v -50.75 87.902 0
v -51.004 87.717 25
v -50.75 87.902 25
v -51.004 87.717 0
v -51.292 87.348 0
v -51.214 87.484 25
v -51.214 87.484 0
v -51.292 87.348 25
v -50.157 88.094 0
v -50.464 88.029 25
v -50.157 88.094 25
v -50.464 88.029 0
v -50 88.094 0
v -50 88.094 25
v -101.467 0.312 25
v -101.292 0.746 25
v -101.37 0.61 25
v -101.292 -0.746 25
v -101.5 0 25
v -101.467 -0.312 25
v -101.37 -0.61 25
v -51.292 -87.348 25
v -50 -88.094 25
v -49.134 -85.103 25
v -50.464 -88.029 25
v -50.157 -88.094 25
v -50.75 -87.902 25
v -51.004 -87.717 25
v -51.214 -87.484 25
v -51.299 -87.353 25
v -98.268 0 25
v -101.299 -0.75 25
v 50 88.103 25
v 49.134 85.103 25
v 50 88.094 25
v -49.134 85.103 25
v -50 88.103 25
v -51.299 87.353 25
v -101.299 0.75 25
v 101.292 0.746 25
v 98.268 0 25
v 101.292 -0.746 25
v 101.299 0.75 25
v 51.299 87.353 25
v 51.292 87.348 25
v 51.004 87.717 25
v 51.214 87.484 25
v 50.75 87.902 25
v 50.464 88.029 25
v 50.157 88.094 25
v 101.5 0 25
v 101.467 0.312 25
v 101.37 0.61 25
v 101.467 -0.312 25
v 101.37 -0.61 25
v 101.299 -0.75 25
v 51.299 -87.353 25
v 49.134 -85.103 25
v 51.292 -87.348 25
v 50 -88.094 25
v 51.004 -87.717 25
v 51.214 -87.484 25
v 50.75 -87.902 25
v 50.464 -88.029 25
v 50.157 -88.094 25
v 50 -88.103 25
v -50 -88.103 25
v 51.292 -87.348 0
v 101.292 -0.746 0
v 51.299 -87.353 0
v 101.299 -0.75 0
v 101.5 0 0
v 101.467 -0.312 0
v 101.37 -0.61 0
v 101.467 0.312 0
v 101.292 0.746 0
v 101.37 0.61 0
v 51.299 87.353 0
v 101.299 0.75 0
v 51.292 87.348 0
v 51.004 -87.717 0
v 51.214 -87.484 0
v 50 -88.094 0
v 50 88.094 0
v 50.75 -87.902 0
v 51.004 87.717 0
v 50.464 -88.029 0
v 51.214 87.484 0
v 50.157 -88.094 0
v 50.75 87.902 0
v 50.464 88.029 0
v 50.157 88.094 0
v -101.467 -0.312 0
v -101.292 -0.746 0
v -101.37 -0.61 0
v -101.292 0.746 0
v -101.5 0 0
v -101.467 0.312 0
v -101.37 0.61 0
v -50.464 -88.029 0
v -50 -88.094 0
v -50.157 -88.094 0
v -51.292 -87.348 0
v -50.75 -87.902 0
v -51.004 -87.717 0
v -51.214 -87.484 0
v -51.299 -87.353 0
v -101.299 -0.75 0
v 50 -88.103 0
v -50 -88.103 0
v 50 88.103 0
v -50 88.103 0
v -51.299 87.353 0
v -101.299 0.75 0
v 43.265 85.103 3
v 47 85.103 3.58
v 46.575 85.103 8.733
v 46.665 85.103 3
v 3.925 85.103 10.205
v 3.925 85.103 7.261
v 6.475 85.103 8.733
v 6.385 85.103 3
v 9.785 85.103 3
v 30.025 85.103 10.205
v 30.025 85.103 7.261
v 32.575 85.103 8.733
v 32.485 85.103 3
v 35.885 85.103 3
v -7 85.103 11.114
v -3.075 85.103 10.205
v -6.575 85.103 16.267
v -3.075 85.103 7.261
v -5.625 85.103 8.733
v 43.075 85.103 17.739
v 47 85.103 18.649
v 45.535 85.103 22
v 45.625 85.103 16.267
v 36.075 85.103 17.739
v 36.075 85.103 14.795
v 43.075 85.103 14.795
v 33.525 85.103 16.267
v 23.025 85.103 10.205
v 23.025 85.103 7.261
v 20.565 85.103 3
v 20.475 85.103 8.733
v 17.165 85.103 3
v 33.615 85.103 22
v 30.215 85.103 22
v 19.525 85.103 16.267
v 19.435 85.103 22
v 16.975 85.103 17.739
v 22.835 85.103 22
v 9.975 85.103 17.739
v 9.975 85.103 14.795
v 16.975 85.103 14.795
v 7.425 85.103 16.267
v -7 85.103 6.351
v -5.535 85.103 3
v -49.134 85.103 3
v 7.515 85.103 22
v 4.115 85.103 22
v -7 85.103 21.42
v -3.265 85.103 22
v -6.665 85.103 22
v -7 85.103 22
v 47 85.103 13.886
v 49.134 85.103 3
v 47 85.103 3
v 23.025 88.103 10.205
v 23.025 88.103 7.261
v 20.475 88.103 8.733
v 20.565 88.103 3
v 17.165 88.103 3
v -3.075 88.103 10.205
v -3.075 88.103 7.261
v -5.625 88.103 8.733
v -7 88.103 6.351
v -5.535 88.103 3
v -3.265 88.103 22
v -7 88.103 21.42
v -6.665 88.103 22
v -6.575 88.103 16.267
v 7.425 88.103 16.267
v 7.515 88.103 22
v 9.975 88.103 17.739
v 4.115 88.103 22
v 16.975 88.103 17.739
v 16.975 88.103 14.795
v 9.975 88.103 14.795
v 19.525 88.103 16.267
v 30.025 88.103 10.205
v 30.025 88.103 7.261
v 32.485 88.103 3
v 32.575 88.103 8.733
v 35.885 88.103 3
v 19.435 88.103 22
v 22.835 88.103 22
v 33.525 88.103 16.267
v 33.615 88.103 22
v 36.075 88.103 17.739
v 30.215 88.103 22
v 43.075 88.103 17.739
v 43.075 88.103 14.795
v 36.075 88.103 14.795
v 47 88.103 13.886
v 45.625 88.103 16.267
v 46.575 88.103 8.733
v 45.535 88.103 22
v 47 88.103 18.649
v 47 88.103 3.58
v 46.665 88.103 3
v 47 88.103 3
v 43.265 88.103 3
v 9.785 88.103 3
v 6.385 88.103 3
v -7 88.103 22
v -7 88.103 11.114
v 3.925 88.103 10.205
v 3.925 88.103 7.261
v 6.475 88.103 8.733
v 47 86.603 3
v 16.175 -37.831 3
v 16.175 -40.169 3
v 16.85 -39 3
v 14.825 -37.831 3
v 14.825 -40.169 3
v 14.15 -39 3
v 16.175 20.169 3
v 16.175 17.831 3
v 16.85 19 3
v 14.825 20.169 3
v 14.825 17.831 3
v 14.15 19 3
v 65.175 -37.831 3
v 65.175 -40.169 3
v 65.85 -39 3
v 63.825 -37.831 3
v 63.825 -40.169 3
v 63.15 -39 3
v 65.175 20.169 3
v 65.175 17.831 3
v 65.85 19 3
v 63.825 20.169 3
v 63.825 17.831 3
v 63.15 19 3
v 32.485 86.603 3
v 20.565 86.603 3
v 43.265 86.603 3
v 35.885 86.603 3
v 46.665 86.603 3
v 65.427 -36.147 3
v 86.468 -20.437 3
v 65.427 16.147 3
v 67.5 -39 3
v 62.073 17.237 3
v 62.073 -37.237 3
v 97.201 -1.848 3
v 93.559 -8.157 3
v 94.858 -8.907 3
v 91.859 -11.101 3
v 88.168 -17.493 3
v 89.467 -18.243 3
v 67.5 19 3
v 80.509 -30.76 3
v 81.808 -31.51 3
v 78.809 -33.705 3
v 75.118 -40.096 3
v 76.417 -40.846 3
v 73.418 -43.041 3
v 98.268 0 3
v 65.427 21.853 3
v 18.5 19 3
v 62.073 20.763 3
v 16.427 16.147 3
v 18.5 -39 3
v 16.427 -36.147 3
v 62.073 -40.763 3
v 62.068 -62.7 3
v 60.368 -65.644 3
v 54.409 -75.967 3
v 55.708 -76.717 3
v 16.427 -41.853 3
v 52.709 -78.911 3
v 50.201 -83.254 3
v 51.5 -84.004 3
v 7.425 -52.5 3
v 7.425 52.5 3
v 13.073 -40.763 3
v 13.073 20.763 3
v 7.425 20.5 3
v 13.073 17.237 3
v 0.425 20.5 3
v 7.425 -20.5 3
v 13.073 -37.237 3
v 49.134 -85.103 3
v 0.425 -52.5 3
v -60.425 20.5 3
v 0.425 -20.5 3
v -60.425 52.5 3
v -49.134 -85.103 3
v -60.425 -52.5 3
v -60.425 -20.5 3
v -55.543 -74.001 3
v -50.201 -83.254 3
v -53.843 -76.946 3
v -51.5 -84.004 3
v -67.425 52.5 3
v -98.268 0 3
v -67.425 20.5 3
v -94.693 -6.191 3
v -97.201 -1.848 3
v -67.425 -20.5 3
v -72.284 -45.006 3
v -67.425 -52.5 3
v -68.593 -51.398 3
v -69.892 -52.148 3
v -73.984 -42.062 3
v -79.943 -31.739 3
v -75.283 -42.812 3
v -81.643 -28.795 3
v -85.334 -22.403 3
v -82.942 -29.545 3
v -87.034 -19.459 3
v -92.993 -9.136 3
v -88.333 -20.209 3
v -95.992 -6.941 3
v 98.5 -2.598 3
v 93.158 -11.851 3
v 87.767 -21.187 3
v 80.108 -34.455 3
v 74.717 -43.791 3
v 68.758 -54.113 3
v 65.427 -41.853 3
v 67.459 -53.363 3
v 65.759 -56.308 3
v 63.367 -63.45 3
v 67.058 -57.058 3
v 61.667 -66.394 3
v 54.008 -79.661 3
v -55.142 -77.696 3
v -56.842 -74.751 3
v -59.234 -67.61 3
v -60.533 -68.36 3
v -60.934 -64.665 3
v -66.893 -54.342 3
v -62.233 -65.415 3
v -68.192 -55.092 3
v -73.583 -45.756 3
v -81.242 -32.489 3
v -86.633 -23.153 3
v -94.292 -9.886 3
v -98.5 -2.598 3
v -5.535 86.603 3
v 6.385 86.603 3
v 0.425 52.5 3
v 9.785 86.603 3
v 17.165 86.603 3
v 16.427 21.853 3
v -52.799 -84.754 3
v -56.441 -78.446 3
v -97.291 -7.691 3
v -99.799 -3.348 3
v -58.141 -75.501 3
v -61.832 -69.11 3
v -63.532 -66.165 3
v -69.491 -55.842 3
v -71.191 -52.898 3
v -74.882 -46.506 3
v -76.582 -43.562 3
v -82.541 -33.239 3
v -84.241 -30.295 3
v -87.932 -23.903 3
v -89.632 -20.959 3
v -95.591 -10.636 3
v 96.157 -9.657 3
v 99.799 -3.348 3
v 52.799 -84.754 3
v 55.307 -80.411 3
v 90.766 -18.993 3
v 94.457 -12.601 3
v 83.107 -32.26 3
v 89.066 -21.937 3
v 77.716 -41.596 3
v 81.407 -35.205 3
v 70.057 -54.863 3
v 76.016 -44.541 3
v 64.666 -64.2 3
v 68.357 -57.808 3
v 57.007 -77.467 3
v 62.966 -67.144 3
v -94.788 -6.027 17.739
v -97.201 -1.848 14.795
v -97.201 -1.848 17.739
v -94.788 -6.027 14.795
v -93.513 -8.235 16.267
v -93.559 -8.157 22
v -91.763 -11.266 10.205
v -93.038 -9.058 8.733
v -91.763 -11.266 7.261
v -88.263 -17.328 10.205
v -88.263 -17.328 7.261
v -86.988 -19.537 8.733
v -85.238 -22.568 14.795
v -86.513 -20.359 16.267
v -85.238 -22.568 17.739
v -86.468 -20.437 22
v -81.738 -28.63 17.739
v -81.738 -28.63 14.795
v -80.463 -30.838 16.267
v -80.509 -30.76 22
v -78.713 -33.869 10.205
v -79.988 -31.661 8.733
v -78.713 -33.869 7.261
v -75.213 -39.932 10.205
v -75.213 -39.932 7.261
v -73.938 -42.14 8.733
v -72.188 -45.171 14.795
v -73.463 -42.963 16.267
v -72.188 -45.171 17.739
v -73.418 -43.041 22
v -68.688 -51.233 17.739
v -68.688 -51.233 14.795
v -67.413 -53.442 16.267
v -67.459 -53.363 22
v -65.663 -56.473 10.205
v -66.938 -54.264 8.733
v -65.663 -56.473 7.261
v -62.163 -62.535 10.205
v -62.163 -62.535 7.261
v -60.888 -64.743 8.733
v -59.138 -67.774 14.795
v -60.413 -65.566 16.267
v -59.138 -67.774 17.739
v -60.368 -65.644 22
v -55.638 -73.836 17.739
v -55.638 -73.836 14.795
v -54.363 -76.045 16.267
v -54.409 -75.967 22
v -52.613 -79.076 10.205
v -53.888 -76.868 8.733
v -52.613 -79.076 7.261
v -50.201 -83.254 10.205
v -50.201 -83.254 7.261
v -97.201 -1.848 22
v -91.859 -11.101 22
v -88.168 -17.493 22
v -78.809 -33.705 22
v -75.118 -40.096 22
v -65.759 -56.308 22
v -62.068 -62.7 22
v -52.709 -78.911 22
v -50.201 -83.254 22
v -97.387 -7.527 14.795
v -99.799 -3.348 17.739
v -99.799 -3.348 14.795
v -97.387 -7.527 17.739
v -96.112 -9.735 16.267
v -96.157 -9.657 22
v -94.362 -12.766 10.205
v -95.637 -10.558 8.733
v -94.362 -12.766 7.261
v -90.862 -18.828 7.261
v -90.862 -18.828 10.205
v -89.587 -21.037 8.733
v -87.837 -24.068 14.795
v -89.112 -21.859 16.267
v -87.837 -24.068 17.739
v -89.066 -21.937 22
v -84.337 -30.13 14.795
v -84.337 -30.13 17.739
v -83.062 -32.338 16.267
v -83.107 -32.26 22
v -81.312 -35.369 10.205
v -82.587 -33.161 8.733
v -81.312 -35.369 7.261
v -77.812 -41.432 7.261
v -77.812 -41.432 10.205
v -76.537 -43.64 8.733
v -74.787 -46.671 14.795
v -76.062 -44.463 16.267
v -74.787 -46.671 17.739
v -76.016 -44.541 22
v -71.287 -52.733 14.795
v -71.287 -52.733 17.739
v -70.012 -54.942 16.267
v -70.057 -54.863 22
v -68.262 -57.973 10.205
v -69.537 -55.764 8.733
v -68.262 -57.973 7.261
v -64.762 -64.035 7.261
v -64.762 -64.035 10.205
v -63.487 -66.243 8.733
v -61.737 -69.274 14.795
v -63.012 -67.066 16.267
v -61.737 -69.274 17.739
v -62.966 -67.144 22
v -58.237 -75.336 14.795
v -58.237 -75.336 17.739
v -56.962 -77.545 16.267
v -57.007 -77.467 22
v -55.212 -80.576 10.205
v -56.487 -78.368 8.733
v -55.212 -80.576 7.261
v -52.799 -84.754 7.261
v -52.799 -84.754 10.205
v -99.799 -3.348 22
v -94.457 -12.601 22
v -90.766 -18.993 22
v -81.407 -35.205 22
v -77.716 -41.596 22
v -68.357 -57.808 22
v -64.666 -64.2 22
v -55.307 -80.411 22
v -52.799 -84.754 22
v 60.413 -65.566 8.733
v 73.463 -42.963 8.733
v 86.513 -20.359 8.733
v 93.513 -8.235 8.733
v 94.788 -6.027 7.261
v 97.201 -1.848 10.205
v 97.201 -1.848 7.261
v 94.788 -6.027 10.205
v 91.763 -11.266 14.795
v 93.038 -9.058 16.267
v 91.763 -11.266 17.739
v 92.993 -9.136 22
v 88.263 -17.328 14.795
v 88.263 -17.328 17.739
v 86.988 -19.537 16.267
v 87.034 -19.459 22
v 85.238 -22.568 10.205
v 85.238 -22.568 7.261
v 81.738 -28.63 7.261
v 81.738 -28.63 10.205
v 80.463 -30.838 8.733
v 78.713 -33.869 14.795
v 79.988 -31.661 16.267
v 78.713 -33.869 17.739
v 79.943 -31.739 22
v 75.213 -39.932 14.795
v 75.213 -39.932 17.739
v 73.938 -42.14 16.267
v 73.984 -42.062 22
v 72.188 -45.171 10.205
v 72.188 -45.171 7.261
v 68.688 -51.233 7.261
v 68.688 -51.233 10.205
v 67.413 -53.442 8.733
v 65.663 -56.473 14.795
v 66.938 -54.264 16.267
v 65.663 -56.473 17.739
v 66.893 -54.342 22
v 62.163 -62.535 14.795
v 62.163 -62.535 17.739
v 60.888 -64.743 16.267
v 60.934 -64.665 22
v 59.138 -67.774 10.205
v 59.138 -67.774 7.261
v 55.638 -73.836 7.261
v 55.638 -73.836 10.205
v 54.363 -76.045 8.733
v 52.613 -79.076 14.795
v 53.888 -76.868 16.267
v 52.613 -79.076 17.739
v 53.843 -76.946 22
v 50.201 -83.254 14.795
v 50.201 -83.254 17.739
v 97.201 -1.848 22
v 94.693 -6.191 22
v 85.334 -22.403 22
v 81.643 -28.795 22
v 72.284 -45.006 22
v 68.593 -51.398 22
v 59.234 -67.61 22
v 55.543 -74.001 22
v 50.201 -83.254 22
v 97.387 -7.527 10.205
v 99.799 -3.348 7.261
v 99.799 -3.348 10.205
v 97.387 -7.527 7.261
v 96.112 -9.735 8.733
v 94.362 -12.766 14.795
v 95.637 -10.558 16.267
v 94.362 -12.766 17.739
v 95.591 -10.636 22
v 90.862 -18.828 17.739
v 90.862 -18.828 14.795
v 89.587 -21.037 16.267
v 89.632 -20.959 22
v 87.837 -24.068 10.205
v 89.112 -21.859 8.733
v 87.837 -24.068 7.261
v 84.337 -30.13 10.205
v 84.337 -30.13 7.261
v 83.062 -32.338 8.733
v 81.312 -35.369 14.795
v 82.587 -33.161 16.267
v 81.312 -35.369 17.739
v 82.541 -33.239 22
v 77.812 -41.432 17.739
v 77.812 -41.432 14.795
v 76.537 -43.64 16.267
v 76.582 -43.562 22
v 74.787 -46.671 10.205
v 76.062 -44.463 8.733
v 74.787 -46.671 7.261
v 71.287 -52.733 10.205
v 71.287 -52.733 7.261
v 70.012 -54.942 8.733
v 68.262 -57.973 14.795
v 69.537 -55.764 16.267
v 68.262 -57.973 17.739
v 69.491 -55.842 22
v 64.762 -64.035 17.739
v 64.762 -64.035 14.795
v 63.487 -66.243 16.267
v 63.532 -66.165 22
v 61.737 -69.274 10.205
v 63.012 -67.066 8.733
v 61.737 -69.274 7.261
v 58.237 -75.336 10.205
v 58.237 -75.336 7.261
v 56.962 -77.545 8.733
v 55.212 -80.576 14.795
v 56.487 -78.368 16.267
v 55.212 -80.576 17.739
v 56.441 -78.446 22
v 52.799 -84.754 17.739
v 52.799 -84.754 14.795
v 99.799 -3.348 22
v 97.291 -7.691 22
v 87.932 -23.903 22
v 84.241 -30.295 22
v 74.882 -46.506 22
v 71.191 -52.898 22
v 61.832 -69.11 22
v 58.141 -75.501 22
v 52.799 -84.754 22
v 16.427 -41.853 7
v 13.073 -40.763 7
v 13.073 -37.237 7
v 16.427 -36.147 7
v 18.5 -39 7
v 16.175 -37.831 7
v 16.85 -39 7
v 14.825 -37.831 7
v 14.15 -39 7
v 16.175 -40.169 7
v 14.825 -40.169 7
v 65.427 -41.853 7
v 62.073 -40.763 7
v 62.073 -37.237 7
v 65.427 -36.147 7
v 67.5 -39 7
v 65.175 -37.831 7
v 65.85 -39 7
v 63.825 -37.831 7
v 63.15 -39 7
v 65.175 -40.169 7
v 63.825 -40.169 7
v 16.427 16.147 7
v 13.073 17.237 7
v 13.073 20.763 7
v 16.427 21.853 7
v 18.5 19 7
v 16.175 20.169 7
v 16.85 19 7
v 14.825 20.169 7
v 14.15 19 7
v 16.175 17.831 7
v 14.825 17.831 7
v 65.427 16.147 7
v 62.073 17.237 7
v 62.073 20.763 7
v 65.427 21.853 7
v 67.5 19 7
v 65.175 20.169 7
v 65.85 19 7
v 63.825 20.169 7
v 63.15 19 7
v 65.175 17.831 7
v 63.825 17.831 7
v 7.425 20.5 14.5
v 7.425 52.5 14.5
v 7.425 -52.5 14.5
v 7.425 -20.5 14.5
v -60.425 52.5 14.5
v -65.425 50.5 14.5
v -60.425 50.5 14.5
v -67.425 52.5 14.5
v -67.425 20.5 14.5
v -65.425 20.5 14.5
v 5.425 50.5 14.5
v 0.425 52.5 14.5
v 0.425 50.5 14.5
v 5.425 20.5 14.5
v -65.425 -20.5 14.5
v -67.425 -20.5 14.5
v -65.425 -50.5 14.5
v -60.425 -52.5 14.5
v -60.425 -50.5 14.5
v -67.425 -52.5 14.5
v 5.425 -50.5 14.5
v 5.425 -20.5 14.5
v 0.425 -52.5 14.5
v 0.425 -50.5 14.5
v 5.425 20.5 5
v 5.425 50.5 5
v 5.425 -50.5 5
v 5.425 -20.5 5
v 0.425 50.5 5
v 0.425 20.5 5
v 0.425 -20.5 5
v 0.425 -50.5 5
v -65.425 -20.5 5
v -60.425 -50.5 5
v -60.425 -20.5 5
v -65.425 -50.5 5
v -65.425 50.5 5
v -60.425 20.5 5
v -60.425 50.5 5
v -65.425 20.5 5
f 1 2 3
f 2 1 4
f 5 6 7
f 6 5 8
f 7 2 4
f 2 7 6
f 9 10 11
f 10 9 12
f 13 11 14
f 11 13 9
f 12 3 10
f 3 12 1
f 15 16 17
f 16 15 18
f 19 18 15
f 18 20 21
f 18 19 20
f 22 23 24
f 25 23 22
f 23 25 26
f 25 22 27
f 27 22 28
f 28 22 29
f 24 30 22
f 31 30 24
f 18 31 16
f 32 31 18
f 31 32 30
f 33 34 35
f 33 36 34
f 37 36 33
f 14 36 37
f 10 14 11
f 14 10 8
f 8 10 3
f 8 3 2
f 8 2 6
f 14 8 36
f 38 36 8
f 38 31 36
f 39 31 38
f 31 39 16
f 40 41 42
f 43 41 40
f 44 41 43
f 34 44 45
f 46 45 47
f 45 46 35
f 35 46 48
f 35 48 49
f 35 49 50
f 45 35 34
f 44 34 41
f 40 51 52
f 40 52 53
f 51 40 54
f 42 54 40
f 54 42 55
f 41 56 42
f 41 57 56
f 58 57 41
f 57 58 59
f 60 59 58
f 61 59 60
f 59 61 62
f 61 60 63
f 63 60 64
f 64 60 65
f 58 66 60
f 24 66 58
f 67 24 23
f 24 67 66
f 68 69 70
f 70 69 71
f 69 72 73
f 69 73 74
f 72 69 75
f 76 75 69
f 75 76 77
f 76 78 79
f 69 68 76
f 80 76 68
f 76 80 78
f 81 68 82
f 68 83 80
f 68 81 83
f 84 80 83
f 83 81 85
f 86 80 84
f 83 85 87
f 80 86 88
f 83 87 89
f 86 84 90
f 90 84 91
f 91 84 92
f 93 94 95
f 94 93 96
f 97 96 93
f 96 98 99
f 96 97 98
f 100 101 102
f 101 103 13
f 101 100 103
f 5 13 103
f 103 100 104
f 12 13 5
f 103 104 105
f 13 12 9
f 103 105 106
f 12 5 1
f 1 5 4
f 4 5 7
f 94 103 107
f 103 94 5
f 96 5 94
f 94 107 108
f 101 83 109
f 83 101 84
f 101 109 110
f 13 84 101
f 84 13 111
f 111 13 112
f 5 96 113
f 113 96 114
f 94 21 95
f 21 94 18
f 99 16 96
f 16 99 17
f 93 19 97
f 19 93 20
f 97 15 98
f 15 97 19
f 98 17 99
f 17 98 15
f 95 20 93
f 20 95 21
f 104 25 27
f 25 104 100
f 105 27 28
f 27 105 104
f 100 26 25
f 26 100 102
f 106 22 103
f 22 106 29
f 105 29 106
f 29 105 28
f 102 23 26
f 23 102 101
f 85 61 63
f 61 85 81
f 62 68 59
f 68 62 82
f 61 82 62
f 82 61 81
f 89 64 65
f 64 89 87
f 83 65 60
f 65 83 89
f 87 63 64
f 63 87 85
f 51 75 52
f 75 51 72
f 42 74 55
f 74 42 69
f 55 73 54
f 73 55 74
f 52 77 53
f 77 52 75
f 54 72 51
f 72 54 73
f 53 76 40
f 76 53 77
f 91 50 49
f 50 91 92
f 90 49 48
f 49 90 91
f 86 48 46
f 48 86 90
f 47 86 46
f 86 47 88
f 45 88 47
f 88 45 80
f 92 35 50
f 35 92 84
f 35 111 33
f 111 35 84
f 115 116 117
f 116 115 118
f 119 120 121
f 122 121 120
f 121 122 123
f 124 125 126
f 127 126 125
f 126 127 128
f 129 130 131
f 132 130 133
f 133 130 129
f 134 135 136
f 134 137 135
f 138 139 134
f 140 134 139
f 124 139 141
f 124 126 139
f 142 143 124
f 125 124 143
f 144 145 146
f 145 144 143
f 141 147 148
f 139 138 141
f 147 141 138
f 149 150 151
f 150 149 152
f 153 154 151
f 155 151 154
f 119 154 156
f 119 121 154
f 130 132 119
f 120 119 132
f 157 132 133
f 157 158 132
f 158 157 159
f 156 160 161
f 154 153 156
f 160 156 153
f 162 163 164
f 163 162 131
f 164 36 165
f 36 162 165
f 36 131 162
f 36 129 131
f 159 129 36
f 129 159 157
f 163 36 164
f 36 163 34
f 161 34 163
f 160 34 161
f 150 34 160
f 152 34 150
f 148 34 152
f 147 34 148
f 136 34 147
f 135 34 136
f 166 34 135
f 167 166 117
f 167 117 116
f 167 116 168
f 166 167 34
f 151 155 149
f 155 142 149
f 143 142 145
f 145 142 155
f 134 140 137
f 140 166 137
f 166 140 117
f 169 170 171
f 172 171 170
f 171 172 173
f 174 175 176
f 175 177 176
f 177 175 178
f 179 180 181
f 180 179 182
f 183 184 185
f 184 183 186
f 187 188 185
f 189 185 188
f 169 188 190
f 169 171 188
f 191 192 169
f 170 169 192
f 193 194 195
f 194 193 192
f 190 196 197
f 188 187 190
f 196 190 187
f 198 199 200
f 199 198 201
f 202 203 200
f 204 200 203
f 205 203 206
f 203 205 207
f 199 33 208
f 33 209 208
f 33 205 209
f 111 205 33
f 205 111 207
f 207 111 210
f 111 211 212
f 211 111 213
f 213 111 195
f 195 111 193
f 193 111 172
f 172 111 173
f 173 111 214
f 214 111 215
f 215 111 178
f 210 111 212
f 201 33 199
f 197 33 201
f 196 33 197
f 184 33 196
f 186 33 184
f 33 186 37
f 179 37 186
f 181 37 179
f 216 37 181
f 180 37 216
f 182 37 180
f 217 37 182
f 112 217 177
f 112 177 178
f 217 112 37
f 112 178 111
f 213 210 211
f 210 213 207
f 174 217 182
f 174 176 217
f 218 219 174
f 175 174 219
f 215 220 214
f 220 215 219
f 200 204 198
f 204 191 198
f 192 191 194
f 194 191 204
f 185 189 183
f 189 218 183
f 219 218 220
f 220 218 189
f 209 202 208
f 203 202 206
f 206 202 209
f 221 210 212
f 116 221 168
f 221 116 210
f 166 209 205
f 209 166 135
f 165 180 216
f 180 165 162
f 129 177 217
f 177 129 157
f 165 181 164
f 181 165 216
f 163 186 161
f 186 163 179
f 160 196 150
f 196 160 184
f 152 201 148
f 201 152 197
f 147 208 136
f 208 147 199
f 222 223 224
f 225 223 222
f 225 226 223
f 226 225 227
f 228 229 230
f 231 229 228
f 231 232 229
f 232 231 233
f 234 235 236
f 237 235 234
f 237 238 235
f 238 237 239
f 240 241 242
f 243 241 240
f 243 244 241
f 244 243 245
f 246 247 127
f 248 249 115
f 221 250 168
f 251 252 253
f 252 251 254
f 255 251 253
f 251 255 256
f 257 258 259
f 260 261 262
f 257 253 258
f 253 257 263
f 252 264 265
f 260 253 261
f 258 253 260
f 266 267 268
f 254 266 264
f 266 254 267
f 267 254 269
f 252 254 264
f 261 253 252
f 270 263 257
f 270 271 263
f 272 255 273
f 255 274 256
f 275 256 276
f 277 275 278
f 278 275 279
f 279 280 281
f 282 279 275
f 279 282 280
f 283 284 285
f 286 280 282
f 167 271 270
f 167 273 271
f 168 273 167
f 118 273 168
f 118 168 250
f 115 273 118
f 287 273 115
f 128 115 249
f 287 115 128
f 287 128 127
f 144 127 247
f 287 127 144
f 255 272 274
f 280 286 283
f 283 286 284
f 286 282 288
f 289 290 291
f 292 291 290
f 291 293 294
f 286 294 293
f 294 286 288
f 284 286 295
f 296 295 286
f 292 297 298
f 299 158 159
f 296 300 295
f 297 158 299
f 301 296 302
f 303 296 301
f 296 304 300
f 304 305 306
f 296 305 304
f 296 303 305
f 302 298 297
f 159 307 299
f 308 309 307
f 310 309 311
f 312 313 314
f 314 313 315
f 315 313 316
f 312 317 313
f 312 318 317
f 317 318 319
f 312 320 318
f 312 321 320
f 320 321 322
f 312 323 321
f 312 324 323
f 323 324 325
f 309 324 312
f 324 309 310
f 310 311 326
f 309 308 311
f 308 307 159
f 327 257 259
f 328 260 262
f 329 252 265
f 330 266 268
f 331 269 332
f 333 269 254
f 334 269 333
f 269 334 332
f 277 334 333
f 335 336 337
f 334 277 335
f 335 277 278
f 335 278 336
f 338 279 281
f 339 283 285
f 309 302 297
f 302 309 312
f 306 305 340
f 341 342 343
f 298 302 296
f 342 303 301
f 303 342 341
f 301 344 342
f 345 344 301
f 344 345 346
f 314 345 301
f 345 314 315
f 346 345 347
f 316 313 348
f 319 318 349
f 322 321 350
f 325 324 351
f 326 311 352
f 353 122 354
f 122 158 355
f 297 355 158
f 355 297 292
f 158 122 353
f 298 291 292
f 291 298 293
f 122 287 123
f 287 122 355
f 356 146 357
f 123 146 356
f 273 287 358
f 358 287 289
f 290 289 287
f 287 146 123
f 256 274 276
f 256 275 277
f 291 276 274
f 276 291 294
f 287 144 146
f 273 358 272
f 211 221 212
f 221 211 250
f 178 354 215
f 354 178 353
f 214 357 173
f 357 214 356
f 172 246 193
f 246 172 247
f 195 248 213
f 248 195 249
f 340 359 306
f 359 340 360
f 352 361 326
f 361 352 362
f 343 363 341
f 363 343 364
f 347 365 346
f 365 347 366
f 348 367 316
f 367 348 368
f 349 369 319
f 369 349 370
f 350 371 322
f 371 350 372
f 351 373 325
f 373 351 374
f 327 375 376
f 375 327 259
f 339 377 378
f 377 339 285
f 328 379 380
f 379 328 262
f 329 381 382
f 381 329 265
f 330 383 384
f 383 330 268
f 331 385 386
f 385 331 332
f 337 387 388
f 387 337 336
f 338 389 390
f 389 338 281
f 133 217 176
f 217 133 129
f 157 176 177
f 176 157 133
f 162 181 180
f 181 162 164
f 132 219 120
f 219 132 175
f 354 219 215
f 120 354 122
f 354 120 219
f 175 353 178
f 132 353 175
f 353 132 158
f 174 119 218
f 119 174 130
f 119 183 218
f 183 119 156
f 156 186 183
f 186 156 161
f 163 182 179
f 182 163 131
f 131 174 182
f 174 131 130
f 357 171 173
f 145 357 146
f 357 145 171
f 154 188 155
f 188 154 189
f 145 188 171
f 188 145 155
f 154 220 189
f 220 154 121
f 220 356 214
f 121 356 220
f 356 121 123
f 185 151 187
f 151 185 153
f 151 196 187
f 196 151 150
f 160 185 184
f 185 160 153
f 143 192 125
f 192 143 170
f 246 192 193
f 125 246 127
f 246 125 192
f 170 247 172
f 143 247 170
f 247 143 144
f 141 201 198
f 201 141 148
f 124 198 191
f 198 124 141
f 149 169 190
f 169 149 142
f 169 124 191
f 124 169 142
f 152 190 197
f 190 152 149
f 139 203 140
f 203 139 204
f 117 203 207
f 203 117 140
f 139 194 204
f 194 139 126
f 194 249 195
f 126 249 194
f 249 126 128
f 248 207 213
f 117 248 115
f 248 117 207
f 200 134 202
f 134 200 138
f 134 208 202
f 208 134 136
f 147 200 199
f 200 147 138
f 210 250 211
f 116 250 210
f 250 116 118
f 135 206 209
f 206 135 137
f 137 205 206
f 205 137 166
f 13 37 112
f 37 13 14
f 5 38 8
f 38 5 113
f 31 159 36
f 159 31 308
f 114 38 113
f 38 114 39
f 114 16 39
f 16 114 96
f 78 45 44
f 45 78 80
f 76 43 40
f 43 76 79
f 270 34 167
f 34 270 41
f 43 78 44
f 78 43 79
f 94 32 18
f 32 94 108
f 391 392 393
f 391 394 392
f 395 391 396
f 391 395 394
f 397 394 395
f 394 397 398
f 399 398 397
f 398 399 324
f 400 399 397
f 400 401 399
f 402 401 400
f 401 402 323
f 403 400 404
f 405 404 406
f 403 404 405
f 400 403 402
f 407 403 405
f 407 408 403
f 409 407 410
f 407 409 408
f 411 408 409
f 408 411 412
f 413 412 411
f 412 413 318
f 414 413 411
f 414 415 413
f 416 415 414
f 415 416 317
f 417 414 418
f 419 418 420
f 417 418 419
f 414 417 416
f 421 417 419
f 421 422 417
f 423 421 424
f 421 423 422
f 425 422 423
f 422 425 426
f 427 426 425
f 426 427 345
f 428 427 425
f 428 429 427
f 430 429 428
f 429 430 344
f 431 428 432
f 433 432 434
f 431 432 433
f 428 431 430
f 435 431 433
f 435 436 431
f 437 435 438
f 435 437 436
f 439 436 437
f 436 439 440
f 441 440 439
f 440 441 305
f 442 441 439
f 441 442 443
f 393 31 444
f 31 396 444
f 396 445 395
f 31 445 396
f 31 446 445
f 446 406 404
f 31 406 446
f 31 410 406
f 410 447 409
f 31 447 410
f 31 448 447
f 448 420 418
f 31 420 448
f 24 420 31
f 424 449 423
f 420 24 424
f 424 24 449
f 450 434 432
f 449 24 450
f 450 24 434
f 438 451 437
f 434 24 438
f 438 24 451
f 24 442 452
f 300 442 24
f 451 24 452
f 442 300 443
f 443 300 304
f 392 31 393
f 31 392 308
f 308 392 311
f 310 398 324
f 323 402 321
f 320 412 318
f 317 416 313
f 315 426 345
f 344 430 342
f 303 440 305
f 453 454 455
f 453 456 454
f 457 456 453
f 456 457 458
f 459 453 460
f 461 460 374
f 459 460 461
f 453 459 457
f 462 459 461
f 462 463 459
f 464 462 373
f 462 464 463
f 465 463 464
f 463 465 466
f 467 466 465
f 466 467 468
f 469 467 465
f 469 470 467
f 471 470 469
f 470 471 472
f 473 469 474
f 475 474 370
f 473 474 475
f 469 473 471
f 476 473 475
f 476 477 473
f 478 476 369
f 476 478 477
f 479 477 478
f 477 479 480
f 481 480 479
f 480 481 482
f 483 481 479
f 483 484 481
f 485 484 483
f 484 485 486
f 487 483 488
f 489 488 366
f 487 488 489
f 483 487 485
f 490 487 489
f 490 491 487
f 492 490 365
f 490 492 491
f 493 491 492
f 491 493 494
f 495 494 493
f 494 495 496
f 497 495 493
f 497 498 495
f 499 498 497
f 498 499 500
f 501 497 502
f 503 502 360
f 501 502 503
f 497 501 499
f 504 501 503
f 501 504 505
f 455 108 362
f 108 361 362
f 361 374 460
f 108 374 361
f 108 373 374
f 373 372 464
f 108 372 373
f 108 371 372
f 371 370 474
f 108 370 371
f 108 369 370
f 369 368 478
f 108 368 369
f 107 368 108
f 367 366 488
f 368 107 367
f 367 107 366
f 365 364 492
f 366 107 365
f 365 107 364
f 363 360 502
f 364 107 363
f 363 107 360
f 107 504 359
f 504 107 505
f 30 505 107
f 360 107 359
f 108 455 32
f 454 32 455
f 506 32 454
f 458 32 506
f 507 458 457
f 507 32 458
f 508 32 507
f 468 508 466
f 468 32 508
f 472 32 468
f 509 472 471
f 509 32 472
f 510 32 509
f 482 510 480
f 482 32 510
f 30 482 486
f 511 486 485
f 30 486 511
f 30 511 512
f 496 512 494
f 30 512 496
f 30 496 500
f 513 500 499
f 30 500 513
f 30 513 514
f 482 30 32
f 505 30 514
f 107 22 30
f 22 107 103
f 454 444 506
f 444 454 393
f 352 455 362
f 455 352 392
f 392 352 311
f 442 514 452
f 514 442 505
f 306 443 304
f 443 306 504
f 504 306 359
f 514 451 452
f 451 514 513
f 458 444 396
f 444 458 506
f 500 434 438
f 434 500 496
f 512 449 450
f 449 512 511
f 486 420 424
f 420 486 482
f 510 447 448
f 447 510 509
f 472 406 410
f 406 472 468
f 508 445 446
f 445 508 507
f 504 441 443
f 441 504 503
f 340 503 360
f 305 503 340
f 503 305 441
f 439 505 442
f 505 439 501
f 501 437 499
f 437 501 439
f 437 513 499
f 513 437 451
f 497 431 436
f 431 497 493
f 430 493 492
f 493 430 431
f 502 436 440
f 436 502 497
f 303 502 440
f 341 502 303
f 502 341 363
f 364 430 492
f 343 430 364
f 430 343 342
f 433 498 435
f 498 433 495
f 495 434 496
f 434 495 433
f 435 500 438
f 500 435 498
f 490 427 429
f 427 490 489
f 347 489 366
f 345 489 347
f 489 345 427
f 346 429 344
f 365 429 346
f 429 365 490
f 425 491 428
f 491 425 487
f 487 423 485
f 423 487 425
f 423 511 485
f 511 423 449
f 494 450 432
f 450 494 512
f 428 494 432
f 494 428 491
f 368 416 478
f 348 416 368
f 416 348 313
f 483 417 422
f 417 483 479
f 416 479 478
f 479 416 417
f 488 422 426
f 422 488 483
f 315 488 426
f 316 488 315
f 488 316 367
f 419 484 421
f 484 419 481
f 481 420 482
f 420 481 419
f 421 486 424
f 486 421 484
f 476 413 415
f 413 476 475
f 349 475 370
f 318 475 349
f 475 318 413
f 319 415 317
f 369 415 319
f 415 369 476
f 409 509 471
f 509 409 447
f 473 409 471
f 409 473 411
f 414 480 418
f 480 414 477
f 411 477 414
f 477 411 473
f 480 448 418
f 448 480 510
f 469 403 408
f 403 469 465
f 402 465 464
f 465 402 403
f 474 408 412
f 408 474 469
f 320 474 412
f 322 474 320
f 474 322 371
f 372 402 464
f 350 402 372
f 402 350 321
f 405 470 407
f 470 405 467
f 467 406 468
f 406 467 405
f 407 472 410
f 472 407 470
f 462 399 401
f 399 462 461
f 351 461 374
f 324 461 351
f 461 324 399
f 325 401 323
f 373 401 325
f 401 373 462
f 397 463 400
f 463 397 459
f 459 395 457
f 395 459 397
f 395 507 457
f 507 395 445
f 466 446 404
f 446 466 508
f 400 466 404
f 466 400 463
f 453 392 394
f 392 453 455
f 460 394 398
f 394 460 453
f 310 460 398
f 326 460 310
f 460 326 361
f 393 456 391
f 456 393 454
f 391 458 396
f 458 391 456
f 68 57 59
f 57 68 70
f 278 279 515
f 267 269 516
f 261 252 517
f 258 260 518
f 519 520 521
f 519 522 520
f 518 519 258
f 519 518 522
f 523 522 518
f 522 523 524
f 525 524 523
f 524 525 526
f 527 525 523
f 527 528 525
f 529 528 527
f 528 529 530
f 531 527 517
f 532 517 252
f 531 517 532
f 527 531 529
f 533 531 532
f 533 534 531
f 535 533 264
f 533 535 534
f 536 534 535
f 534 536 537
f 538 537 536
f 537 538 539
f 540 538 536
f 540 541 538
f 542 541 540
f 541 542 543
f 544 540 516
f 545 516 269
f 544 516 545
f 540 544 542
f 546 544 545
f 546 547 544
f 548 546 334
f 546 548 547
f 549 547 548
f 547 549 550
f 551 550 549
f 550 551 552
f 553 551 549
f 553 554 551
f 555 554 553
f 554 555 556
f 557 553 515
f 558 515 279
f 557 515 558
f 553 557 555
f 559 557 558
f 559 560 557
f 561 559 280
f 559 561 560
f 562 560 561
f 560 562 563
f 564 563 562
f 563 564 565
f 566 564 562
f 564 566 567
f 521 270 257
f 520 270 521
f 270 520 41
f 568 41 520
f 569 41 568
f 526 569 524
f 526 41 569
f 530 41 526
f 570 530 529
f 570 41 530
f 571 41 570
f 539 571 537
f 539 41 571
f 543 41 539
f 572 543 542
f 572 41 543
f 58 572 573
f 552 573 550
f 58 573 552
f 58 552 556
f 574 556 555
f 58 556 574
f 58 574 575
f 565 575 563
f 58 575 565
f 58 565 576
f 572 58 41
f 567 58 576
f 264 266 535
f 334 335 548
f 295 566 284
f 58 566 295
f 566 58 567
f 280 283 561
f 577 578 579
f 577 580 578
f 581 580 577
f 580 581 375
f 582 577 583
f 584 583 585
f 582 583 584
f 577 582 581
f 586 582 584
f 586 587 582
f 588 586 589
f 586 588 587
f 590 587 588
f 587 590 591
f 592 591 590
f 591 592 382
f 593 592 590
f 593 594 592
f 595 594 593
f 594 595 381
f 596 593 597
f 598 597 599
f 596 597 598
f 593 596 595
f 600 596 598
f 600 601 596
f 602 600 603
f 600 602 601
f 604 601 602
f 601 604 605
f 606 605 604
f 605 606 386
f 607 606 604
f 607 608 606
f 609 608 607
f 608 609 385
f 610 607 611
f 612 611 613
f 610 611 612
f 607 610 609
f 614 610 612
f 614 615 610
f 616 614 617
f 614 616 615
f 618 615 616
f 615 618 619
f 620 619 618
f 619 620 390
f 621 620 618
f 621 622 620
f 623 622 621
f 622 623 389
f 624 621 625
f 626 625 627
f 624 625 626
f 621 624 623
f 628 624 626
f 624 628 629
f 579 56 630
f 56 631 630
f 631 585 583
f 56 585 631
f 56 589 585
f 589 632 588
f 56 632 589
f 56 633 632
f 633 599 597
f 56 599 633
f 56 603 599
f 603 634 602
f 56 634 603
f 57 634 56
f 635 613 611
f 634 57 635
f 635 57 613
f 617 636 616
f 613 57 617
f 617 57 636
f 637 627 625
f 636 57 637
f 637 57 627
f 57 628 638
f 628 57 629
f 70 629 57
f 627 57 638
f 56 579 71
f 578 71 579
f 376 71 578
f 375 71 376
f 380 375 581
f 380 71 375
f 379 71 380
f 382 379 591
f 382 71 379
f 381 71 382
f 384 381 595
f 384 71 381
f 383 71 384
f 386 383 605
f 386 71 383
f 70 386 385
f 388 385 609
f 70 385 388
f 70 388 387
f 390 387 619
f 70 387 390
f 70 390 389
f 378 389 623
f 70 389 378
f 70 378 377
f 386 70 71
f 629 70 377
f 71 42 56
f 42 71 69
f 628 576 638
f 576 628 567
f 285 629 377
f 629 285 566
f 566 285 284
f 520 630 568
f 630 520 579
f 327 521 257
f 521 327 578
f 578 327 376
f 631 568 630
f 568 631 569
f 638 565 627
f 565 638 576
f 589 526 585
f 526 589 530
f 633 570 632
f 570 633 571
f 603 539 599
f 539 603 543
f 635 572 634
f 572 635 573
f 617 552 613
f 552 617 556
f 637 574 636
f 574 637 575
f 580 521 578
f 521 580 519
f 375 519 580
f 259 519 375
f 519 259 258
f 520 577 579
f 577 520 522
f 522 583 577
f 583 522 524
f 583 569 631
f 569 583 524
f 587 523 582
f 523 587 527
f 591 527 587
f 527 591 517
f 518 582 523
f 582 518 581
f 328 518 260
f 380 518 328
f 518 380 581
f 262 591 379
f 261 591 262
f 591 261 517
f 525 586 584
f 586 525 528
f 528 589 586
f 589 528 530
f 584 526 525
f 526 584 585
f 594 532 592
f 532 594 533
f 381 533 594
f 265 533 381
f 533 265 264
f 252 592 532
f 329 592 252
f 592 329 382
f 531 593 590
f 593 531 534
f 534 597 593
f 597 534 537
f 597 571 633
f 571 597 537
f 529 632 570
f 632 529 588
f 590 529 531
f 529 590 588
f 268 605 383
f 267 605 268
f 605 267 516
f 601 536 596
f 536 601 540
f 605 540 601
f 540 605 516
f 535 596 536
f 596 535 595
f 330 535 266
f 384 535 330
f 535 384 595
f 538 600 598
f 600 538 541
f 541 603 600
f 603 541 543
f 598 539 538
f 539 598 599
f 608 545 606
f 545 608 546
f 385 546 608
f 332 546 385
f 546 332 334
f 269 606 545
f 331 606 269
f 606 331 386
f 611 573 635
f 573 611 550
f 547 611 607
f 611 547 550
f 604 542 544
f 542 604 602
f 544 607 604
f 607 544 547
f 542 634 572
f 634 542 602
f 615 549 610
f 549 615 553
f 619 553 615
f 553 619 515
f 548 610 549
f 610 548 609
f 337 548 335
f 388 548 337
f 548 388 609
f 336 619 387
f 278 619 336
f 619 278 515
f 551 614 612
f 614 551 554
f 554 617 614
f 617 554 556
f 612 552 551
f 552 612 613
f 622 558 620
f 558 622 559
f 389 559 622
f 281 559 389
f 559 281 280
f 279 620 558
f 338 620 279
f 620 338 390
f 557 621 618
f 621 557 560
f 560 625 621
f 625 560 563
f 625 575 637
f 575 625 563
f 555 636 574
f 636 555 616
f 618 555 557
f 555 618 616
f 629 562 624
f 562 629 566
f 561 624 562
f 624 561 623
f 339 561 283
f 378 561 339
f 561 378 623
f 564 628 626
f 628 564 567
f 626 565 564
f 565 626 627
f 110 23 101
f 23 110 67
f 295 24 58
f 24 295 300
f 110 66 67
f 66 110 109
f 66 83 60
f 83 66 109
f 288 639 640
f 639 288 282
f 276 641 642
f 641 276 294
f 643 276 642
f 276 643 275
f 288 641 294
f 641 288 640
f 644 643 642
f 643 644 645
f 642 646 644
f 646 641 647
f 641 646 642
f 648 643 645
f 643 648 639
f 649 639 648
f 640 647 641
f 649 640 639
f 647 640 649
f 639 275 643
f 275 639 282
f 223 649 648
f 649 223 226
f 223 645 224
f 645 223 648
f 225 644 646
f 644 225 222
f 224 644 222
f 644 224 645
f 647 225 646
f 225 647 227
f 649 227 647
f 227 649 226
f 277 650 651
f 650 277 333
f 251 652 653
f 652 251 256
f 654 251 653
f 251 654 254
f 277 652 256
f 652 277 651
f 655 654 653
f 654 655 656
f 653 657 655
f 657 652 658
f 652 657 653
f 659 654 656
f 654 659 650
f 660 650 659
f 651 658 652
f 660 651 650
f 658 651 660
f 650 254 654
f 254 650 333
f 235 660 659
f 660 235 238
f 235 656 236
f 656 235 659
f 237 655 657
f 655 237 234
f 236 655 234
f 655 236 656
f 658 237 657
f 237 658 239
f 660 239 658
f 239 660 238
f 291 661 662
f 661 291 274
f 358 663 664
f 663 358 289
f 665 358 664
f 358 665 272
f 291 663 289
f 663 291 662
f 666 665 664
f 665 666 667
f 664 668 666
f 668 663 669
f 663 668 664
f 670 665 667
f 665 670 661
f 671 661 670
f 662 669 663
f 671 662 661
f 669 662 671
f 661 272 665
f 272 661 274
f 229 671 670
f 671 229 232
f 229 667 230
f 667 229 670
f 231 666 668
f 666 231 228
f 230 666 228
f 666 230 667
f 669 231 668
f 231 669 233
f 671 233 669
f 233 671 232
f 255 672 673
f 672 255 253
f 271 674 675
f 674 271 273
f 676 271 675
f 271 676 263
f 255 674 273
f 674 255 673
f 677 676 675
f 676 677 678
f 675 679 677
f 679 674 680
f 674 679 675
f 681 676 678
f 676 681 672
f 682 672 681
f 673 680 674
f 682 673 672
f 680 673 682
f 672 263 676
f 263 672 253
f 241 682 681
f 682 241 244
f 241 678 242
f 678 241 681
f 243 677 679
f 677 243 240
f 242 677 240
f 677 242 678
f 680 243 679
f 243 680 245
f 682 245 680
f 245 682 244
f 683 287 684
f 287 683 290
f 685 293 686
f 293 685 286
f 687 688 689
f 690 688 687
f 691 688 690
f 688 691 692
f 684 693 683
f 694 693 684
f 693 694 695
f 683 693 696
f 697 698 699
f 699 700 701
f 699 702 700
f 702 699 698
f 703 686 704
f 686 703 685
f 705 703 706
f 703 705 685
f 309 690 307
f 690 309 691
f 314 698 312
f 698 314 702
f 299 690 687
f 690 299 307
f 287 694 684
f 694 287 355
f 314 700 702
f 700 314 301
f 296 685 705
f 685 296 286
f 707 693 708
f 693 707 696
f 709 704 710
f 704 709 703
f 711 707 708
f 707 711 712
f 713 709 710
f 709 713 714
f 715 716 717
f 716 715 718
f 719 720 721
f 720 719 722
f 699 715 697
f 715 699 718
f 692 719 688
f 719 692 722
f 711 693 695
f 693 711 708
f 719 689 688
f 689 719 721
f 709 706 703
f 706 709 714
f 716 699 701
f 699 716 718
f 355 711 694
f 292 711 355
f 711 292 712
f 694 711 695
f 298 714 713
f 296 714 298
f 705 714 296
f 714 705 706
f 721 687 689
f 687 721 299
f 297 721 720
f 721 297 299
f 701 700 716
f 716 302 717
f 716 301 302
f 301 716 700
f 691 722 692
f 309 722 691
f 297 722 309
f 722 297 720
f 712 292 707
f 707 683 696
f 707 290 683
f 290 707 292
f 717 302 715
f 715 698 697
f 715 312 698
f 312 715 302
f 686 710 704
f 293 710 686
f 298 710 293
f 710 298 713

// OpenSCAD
// file: honeycomb.scad
/**
 * Render the cells of a honeycomb.
 *
 * @param horizontal_cells The horizontal number of cells.
 * @param vertical_cells The vertical number of cells.
 * @param cell_radius The inner radius of each cell.
 * @param cell_distance The amount of space between any two neighboring cells.
 * @param thickness The depth of the honeycomb sheet.
 */
module honeycomb(
    horizontal_cells,
    vertical_cells,
    cell_radius,
    cell_distance,
    thickness
)
{
    n = horizontal_cells;
    m = vertical_cells;
    r = cell_radius;
    d = cell_distance;

    rd = r + d;
    w = 2 * rd;
    h = sqrt(3) * rd;
    for (row = [-n/2 : n/2], col = [-m/2 : m/2]) {
        x = rd * 3/2 * row;
        y = rd * sqrt(3) * (col + 0.5 * (row % 2));
        translate([x, y, 0])
            cylinder(
                h      = thickness,
                r      = r,
                $fn    = 6,
                center = true
            );
    }
}

/**
 * Render the skeleton of a honeycomb with a rectangular outline around it.
 *
 * @param width The width of the grill.
 * @param height The height of the grill.
 * @param thickness The depth of the grill.
 * @param outline The width of the outline.
 * @param cell_radius The inner radius of each cell.
 * @param cell_distance The amount of space between any two neighboring cells.
 */
module grill(
    width,
    height,
    thickness,
    outline,
    cell_radius,
    cell_distance
)
{
    // Grill outline.
    difference() {
        cube(
            size = [
                width,
                height,
                thickness
            ],
            center = true
        );
        cube(
            size = [
                width - 2 * outline,
                height - 2 * outline,
                2 * thickness
            ],
            center = true
        );
    }

    // Grill honeycomb.
    difference() {
        cube(
            size = [
                width - outline,
                height - outline,
                thickness
            ],
            center = true
        );
        honeycomb(
            horizontal_cells = ceil(width  / cell_radius),
            vertical_cells   = ceil(height / cell_radius),
            cell_radius      = cell_radius,
            cell_distance    = cell_distance,
            thickness        = 2 * thickness
        );
    }
}
// file: screw.scad
/**
 * Render a hexagonal socket for a threaded insert.
 *
 * @param radius The inner radius of the socket.
 * @param length The length of the socket.
 * @param thickness The difference between the inner radius and the outer
 *                  radius of the socket.
 */
module threaded_insert_socket(radius, length, thickness)
{
    difference() {
        cylinder(
            r      = radius + thickness,
            h      = length,
            $fn    = 5
        );
        translate([0, 0, -length/2])
            cylinder(
                r      = radius,
                h      = 2 * length,
                $fn    = 6
            );
    }
}
// file: wall.scad
use <honeycomb.scad>;

module back_wall(
    width,
    height,
    thickness,
    panel_width,
    outline,
    cell_radius,
    cell_distance
)
{
    color([102, 255, 102] / 255)
    translate([panel_width/2, 0, height/2])
    rotate([90, 0, 0])
        grill(
            width         = width - panel_width,
            height        = height,
            thickness     = thickness,
            outline       = outline          ,
            cell_radius   = cell_radius,
            cell_distance = cell_distance
        );

    color([255, 102, 102] / 255)
    translate([-width/2 + panel_width/2, 0, height/2])
    rotate([90, 0, 0])
        cube(
            size = [
                panel_width,
                height,
                thickness
            ],
            center = true
        );
}

module back_side_wall(width, height, thickness)
{
    color([255, 255, 102] / 255)
    translate([0, 0, height/2])
    rotate([90, 0, 0])
        cube(size = [width, height, thickness], center = true);
}

module front_side_wall(
    width,
    height,
    thickness,
    outline,
    cell_radius,
    cell_distance
)
{
    color([102, 102, 255] / 255)
    translate([0, 0, height/2])
    rotate([90, 0, 0])
        grill(
            width,
            height,
            thickness,
            outline,
            cell_radius,
            cell_distance
        );
}

module front_wall(width, height, thickness) {
    color([102, 255, 255] / 255)
    translate([0, 0, height/2])
    rotate([90, 0, 0])
        cube(size = [width, height, thickness], center = true);
}
// file: rpi.scad
use <screw.scad>;

/**
 * Render a set of threaded insert sockets suitable for mounting a
 * Raspberry Pi 4B.
 * In preview mode, also render a cuboid with the same dimensions as a
 * Raspberry Pi 4B.
 *
 * @param length The length of all of the threaded inserts.
 */
module raspberry_pi_4b_threaded_insert_sockets(length)
{
    // These parameters can be found in rpi_MECH_4b_4p0.pdf.
    width                   = 56.00;
    height                  = 85.00;
    depth                   = 10.00;
    mount_radius            =  1.35;
    mount_thickness         =  1.65;
    vertical_mount_distance = 58.00;

    // TODO: Investigate screw types and thread inserts.
    mount_points = [
        [ -width/2 + 3.5, -height/2 + 3.5,                           0 ],
        [  width/2 - 3.5, -height/2 + 3.5,                           0 ],
        [ -width/2 + 3.5, -height/2 + 3.5 + vertical_mount_distance, 0 ],
        [  width/2 - 3.5, -height/2 + 3.5 + vertical_mount_distance, 0 ]
    ];
    for (mount_point = mount_points)
        color([255, 102, 255] / 255)
        translate(mount_point)
            threaded_insert_socket(
                radius    = mount_radius,
                length    = length,
                thickness = mount_thickness
            );

    if ($preview)
        color([102, 102, 102] / 255)
        translate([0, 0, length + depth/2])
            cube(
                size   = [width, height, depth],
                center = true
            );
}
// file: hdd.scad
/**
 * Render a bay suitable for mounting a 2.5” HDD.
 * The bay has holes in the side for inserting screwing.
 * No threaded inserts are needed;
 * the 2.5” HDD should already have threads.
 *
 * In preview mode, also render a cuboid with the same dimensions as a
 * 2.5” HDD.
 */
module hdd_2_5_bay()
{
    // These parameters can be found on
    // Wikipedia, List of disk drive form factors.
    width  =  69.85;
    height = 100.00;
    depth  =   9.50;
    // TODO: Figure out screw sizes.

    // TODO: Figure out optimal thickness.
    thickness = 2;

    // TODO: Figure out optimal quadrant size.
    quadrant_width  =  5;
    quadrant_height = 30;

    // TODO: Figure out the optimal margin.
    margin = 1;
    eff_width  = width + margin;
    eff_height = height + margin;

    // TODO: Render screw holes.

    color([255, 102, 255] / 255)
    translate([0, 0, depth/2 + thickness/2])
        difference() {

            // Render the outer cube.
            cube(
                size = [
                    eff_width  + 2 * thickness,
                    eff_height + 2 * thickness,
                    depth + thickness
                ],
                center = true
            );

            // Cut away space for the 2.5” HDD.
            translate([0, 0, thickness])
                cube(
                    size = [
                        eff_width,
                        eff_height,
                        depth + thickness
                    ],
                    center = true
                );

            // Cut away a cross of redundant material.
            // This also allows removing the 2.5” HDD by hand.
            cube(
                size = [
                    eff_width - 2 * quadrant_width,
                    2 * (eff_height + thickness),
                    2 * (depth + thickness)
                ],
                center = true
            );
            cube(
                size = [
                    2 * (eff_width + thickness),
                    eff_height - 2 * quadrant_height,
                    2 * (depth + thickness)
                ],
                center = true
            );
        }

    // Render a 2.5” HDD.
    if ($preview)
        color([102, 102, 102] / 255)
        translate([0, 0, thickness + depth/2])
            cube(
                size   = [width, height, depth],
                center = true
            );
}
// main file
use <hdd.scad>;
use <rpi.scad>;
use <wall.scad>;

module case_floor(
    wall_length,
    thickness
)
{
    cylinder(
        r   = wall_length,
        h   = thickness,
        $fn = 6
    );
}

module case_walls(
    wall_length,
    thickness,
    height
)
{
    radius = wall_length * cos(30);

    for (th = [0 : 5])
        color([255, 255, 255] / 255)
        rotate([0, 0, 60 * th])
        translate([-wall_length/2, radius, 0])
            cylinder(
                r   = thickness / 2,
                h   = height,
                $fn = 30
            );

    translate([0, radius, 0])
        back_wall(
            width         = wall_length,
            height        = height,
            thickness     = thickness,
            panel_width   = 40.0,
            outline       =  3.0,
            cell_radius   =  7.0,
            cell_distance =  1.7
        );

    for (th = [60, 300])
        rotate([0, 0, th])
        translate([0, radius, 0])
            back_side_wall(
                width     = wall_length,
                height    = height,
                thickness = thickness
            );

    for (th = [120, 240])
        rotate([0, 0, th])
        translate([0, radius, 0])
            front_side_wall(
                width         = wall_length,
                height        = height,
                thickness     = thickness,
                outline       = 3.0,
                cell_radius   = 7.0,
                cell_distance = 1.7
            );

    rotate([0, 0, 180])
    translate([0, radius, 0])
        front_wall(
                width     = wall_length,
                height    = height,
                thickness = thickness
        );
}

module case(
    floor_thickness,
    wall_length,
    wall_thickness,
    height
)
{
    case_floor(
        wall_length = wall_length,
        thickness   = floor_thickness
    );

    case_walls(
        wall_length = wall_length,
        thickness   = wall_thickness,
        height      = height
    );
}

case(
    floor_thickness =   3.0,
    wall_length     = 100.0,
    wall_thickness  =   3.0,
    height          =  25.0
);

translate([40, 0, 3])
    raspberry_pi_4b_threaded_insert_sockets(length = 4);

translate([-30, 0, 3])
    hdd_2_5_bay();
